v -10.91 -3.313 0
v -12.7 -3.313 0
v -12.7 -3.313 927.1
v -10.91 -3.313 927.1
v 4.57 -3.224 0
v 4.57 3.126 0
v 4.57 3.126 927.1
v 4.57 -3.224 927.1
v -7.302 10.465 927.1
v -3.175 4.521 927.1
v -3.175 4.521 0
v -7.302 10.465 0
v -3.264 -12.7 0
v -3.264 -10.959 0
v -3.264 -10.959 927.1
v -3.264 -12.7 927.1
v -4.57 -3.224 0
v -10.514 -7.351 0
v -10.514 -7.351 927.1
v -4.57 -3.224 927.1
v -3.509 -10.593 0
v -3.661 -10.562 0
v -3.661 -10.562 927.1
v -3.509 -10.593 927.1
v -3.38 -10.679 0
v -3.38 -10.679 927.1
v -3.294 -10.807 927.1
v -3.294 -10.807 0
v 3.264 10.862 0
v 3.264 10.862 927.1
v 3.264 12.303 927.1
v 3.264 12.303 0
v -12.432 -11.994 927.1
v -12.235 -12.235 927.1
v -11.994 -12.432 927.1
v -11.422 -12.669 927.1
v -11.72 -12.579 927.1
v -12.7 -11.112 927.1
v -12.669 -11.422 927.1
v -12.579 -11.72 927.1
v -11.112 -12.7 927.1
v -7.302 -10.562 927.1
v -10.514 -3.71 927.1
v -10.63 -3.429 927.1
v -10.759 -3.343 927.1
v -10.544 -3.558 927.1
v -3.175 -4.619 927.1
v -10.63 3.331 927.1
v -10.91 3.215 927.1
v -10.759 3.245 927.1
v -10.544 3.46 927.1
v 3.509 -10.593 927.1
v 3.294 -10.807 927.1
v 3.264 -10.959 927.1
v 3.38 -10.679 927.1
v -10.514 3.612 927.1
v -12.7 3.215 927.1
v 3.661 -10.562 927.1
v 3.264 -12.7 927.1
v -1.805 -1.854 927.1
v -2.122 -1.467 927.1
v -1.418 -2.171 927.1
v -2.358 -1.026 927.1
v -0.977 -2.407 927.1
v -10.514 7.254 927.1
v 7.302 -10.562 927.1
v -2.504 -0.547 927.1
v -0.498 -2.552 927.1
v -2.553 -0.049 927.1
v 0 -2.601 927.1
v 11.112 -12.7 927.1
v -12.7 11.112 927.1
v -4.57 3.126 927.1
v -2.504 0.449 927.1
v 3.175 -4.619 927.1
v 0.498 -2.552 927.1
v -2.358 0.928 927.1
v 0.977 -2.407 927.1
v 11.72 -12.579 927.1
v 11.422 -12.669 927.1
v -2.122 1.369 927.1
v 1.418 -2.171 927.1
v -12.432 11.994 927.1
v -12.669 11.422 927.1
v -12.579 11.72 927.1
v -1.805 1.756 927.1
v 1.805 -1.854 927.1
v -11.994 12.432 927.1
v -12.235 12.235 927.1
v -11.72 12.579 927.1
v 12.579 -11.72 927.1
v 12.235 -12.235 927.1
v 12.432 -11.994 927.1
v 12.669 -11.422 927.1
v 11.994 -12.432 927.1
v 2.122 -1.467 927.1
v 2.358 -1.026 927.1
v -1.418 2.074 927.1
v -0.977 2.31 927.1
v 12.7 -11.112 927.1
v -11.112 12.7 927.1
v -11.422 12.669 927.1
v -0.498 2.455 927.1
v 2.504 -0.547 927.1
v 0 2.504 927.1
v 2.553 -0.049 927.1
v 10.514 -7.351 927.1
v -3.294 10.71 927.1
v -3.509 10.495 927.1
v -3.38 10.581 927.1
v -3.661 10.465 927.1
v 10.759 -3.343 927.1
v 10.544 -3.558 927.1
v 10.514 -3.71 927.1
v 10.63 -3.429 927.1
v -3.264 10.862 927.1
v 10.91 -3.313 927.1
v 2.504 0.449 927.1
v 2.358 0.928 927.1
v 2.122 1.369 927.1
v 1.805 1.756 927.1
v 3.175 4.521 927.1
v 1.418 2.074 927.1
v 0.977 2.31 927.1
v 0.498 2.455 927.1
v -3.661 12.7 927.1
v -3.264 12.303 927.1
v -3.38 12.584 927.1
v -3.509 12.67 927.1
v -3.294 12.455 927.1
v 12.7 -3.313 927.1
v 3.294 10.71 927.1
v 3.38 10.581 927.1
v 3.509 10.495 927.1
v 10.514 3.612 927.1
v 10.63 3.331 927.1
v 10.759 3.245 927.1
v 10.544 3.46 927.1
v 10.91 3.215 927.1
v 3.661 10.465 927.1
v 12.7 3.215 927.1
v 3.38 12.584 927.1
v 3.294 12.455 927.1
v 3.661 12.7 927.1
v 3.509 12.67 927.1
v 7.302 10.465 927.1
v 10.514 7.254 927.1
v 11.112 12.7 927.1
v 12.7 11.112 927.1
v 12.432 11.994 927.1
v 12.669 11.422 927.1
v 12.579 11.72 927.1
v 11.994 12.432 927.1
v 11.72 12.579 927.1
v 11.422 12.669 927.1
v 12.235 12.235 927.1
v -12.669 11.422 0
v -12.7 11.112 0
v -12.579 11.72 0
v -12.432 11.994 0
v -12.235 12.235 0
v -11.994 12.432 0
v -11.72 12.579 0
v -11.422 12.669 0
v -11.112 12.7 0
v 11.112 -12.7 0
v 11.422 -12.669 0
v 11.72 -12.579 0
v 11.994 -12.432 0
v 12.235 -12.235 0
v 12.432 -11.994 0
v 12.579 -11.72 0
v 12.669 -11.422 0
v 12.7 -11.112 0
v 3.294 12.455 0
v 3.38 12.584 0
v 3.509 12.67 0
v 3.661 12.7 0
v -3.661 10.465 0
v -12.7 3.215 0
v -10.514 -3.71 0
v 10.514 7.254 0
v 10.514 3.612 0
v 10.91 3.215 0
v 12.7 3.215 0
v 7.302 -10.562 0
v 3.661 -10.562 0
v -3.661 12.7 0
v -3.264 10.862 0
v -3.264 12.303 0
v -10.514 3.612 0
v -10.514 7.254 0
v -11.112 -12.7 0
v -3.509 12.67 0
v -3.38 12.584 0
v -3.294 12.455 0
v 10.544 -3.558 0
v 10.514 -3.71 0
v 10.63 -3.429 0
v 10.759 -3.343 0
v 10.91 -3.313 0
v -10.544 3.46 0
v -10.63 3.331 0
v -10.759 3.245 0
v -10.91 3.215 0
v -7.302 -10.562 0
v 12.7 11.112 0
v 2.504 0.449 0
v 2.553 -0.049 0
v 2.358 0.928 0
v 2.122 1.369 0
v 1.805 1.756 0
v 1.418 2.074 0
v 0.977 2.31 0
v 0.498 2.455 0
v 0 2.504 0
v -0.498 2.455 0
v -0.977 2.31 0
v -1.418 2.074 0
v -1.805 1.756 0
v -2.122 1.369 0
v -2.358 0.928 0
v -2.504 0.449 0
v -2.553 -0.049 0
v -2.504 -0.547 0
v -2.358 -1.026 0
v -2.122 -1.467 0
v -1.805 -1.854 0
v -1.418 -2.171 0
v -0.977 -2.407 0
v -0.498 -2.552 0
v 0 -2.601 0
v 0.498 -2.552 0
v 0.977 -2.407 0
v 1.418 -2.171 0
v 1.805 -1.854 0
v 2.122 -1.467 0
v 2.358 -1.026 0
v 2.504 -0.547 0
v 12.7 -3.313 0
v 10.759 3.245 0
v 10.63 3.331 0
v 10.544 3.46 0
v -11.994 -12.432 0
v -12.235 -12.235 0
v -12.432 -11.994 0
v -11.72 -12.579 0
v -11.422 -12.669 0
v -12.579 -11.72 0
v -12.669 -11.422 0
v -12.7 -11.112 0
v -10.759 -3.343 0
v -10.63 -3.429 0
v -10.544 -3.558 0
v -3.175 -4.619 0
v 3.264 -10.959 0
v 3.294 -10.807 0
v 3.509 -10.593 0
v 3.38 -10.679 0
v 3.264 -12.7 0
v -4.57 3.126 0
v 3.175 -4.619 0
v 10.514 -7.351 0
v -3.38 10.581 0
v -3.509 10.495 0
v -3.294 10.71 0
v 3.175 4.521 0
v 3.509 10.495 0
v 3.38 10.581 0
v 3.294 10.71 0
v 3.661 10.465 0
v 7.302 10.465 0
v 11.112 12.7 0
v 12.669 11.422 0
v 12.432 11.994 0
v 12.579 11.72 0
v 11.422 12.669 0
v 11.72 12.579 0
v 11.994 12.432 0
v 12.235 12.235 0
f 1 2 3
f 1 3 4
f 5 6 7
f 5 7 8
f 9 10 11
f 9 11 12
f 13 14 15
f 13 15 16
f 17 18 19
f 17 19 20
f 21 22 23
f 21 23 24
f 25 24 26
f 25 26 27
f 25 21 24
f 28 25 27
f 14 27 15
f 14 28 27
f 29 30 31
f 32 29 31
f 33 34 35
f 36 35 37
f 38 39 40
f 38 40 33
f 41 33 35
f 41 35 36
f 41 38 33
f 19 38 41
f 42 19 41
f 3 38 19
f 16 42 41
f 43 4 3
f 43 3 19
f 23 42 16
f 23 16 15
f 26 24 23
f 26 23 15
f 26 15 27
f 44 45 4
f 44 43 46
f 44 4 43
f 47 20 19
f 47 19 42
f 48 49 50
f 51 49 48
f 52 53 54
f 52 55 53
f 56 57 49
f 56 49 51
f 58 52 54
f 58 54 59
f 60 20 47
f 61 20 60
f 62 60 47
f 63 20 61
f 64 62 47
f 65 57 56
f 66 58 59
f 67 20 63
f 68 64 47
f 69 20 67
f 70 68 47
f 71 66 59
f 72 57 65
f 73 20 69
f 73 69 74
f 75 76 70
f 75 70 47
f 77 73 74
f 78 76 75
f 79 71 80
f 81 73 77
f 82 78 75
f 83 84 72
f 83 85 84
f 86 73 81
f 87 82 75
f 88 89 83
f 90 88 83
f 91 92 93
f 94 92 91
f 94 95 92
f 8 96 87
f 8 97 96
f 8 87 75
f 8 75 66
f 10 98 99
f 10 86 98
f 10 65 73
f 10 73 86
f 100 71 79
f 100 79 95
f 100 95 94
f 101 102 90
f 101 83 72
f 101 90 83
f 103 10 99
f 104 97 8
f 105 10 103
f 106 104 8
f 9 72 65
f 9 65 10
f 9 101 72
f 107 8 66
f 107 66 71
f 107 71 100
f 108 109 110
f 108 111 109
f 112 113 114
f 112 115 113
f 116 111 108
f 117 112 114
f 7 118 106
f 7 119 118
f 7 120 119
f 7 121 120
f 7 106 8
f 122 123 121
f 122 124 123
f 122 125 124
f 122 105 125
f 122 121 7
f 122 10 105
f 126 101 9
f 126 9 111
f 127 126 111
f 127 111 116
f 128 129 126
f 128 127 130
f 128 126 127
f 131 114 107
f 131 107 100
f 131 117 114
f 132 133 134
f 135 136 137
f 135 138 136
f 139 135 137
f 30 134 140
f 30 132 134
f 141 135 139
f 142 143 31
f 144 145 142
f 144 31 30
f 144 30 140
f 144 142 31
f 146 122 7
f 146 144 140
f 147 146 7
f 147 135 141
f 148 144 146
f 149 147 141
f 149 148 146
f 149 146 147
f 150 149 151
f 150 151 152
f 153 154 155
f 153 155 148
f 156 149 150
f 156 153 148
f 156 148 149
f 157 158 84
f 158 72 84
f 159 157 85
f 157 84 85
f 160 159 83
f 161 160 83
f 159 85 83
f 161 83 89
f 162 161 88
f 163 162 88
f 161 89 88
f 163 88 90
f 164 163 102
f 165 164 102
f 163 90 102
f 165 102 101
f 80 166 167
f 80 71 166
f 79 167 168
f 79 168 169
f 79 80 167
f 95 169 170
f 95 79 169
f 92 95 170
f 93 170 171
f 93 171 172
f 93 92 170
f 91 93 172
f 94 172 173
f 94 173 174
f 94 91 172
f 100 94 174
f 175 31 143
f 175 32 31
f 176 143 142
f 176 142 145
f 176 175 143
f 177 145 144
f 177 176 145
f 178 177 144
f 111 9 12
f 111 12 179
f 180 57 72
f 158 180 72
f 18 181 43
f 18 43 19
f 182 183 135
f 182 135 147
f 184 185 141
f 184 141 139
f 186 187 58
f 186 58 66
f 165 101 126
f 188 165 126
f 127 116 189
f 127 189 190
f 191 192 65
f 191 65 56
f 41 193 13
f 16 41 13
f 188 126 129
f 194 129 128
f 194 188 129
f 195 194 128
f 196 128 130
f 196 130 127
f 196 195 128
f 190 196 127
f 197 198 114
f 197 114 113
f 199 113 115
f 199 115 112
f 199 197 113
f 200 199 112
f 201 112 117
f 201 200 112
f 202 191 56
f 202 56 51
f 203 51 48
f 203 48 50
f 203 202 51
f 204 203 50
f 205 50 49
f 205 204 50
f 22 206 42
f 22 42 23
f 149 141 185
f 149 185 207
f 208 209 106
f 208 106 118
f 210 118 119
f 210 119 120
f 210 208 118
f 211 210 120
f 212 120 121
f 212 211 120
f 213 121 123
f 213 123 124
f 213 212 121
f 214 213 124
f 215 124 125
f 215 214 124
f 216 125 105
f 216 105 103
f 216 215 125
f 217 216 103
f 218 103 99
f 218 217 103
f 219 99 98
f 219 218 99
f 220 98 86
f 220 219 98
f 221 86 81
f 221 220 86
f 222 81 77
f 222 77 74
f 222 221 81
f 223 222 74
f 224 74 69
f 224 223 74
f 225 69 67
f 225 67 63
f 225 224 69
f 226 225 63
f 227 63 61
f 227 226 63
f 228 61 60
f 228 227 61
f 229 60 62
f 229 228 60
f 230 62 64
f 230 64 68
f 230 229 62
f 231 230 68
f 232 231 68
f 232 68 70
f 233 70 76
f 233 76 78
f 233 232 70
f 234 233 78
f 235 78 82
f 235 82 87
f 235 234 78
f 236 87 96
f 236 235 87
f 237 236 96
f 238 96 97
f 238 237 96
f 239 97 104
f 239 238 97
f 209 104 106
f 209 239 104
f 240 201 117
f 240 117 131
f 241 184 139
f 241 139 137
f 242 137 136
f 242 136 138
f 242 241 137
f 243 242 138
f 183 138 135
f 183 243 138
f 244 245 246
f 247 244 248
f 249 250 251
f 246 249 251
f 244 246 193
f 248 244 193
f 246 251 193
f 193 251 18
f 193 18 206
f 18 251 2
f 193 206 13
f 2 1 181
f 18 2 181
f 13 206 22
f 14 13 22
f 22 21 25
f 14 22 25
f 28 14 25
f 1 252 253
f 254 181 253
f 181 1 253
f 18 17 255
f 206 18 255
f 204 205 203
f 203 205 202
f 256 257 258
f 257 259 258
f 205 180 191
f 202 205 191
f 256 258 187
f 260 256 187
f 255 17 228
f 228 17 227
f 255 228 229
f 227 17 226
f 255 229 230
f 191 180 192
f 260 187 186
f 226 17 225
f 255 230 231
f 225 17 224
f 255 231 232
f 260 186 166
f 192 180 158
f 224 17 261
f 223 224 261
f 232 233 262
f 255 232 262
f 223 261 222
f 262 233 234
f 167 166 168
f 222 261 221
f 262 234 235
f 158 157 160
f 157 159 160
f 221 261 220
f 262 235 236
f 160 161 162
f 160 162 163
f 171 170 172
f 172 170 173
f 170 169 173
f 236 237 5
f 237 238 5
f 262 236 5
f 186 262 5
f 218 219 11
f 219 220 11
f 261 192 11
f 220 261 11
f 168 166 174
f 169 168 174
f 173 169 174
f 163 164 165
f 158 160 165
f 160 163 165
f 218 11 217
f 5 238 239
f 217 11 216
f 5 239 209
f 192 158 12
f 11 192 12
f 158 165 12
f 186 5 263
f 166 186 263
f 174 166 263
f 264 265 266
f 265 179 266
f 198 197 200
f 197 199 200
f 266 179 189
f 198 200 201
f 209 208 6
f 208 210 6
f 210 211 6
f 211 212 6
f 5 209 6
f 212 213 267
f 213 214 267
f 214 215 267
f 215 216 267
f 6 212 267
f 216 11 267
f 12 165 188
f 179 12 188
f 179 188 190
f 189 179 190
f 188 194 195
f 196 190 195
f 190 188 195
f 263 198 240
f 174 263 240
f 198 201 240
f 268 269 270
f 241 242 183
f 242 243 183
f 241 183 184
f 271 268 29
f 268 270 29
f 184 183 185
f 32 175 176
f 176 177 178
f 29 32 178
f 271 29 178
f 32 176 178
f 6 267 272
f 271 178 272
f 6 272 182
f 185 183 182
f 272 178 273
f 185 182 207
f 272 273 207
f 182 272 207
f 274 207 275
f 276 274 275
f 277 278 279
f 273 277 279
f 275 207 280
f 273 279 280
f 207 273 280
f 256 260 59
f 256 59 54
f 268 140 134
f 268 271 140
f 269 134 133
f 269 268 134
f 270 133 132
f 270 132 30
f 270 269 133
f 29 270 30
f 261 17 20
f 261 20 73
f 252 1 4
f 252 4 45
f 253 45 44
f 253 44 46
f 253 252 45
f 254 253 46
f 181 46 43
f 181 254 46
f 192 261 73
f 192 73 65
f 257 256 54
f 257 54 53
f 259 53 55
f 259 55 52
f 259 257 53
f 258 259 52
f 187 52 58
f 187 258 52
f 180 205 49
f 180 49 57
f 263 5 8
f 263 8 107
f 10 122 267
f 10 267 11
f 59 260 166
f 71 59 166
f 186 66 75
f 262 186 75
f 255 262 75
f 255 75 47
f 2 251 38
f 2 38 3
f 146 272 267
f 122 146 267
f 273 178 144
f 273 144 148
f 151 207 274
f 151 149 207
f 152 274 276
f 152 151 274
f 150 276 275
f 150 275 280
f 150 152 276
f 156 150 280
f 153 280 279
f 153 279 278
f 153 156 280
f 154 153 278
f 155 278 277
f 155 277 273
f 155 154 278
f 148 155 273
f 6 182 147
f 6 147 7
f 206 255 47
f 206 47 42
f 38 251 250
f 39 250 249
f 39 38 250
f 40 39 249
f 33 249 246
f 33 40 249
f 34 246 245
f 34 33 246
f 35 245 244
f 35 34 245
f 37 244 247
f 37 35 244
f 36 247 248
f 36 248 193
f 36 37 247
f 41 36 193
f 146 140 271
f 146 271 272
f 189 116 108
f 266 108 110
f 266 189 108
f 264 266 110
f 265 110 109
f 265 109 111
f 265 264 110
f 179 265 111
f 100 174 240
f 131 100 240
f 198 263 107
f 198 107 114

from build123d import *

# Parameters (mm, degrees)
SKETCH1_W           = 25.4
SKETCH1_H           = 25.4
BOSS_EXTRUDE1_DEPTH = 927.1
FILLET1_R           = 1.5875
HOLE1_OUTLINE_R     = 2.5527
HOLE1_DEPTH         = 927.1
SKETCH7_W           = 6.5278
SKETCH7_H           = 2.2352
CUT_EXTRUDE2_DEPTH  = 927.1
FILLET4_R           = 0.396875
CIRPATTERN2_DEPTH   = 927.1


# Read off the part's stored shape, not the designer's step: Hole1, CirPattern2
with BuildPart() as part:
    # Sketch1 → Boss-Extrude1 (new body)
    with BuildSketch(Plane.XY):
        Rectangle(SKETCH1_W, SKETCH1_H)
    extrude(amount=BOSS_EXTRUDE1_DEPTH)

    # Fillet1
    fillet1_edges = [part.edges().sort_by_distance(p)[0] for p in [
        (12.7, -12.7, 463.55),
        (-12.7, -12.7, 463.55),
        (-12.7, 12.7, 463.55),
        (12.7, 12.7, 463.55),
    ]]
    fillet(fillet1_edges, radius=FILLET1_R)

    # Hole1 outline → Hole1 (cut)
    with BuildSketch(Plane.XY):
        with Locations((0, -0.048792482)):
            Circle(HOLE1_OUTLINE_R)
    extrude(amount=HOLE1_DEPTH, mode=Mode.SUBTRACT)

    # Sketch7 → Cut-Extrude2 (cut)
    with BuildSketch(Plane.XY.offset(927.1)):
        with Locations((0, 11.5824)):
            Rectangle(SKETCH7_W, SKETCH7_H)
        Polygon((-3.175, 4.5212), (-7.3025, 10.4648), (7.3025, 10.4648), (3.175, 4.5212), align=None)
    extrude(amount=-CUT_EXTRUDE2_DEPTH, mode=Mode.SUBTRACT)

    # Fillet4
    fillet4_edges = [part.edges().sort_by_distance(p)[0] for p in [
        (-3.2639, 10.4648, 463.55),
        (-3.2639, 12.7, 463.55),
        (3.2639, 12.7, 463.55),
        (3.2639, 10.4648, 463.55),
    ]]
    fillet(fillet4_edges, radius=FILLET4_R)

    # CirPattern2 outline → CirPattern2 (cut)
    with BuildSketch(Plane.XY):
        with BuildLine():
            ThreePointArc((-3.660775, -10.562384964), (-3.380141996, -10.67862696), (-3.2639, -10.959259964))
            Line((-3.2639, -10.959259964), (-3.2639, -12.7))
            Line((-3.2639, -12.7), (3.2639, -12.7))
            Line((3.2639, -12.7), (3.2639, -10.959259964))
            ThreePointArc((3.2639, -10.959259964), (3.380141996, -10.67862696), (3.660775, -10.562384964))
            Line((3.660775, -10.562384964), (7.3025, -10.562384964))
            Line((7.3025, -10.562384964), (3.175, -4.618784964))
            Line((3.175, -4.618784964), (-3.175, -4.618784964))
            Line((-3.175, -4.618784964), (-7.3025, -10.562384964))
            Line((-7.3025, -10.562384964), (-3.660775, -10.562384964))
        make_face()
        with BuildLine():
            Line((-12.7, -3.312692482), (-10.910467482, -3.312692482))
            ThreePointArc((-10.910467482, -3.312692482), (-10.629834478, -3.428934478), (-10.513592482, -3.709567482))
            Line((-10.513592482, -3.709567482), (-10.513592482, -7.351292482))
            Line((-10.513592482, -7.351292482), (-4.569992482, -3.223792482))
            Line((-4.569992482, -3.223792482), (-4.569992482, 3.126207518))
            Line((-4.569992482, 3.126207518), (-10.513592482, 7.253707518))
            Line((-10.513592482, 7.253707518), (-10.513592482, 3.611982518))
            ThreePointArc((-10.513592482, 3.611982518), (-10.629834478, 3.331349514), (-10.910467482, 3.215107518))
            Line((-10.910467482, 3.215107518), (-12.7, 3.215107518))
            Line((-12.7, 3.215107518), (-12.7, -3.312692482))
        make_face()
        with BuildLine():
            ThreePointArc((10.513592482, -3.709567482), (10.629834478, -3.428934478), (10.910467482, -3.312692482))
            Line((10.910467482, -3.312692482), (12.7, -3.312692482))
            Line((12.7, -3.312692482), (12.7, 3.215107518))
            Line((12.7, 3.215107518), (10.910467482, 3.215107518))
            ThreePointArc((10.910467482, 3.215107518), (10.629834478, 3.331349514), (10.513592482, 3.611982518))
            Line((10.513592482, 3.611982518), (10.513592482, 7.253707518))
            Line((10.513592482, 7.253707518), (4.569992482, 3.126207518))
            Line((4.569992482, 3.126207518), (4.569992482, -3.223792482))
            Line((4.569992482, -3.223792482), (10.513592482, -7.351292482))
            Line((10.513592482, -7.351292482), (10.513592482, -3.709567482))
        make_face()
    extrude(amount=CIRPATTERN2_DEPTH, mode=Mode.SUBTRACT)


solid = part.part
